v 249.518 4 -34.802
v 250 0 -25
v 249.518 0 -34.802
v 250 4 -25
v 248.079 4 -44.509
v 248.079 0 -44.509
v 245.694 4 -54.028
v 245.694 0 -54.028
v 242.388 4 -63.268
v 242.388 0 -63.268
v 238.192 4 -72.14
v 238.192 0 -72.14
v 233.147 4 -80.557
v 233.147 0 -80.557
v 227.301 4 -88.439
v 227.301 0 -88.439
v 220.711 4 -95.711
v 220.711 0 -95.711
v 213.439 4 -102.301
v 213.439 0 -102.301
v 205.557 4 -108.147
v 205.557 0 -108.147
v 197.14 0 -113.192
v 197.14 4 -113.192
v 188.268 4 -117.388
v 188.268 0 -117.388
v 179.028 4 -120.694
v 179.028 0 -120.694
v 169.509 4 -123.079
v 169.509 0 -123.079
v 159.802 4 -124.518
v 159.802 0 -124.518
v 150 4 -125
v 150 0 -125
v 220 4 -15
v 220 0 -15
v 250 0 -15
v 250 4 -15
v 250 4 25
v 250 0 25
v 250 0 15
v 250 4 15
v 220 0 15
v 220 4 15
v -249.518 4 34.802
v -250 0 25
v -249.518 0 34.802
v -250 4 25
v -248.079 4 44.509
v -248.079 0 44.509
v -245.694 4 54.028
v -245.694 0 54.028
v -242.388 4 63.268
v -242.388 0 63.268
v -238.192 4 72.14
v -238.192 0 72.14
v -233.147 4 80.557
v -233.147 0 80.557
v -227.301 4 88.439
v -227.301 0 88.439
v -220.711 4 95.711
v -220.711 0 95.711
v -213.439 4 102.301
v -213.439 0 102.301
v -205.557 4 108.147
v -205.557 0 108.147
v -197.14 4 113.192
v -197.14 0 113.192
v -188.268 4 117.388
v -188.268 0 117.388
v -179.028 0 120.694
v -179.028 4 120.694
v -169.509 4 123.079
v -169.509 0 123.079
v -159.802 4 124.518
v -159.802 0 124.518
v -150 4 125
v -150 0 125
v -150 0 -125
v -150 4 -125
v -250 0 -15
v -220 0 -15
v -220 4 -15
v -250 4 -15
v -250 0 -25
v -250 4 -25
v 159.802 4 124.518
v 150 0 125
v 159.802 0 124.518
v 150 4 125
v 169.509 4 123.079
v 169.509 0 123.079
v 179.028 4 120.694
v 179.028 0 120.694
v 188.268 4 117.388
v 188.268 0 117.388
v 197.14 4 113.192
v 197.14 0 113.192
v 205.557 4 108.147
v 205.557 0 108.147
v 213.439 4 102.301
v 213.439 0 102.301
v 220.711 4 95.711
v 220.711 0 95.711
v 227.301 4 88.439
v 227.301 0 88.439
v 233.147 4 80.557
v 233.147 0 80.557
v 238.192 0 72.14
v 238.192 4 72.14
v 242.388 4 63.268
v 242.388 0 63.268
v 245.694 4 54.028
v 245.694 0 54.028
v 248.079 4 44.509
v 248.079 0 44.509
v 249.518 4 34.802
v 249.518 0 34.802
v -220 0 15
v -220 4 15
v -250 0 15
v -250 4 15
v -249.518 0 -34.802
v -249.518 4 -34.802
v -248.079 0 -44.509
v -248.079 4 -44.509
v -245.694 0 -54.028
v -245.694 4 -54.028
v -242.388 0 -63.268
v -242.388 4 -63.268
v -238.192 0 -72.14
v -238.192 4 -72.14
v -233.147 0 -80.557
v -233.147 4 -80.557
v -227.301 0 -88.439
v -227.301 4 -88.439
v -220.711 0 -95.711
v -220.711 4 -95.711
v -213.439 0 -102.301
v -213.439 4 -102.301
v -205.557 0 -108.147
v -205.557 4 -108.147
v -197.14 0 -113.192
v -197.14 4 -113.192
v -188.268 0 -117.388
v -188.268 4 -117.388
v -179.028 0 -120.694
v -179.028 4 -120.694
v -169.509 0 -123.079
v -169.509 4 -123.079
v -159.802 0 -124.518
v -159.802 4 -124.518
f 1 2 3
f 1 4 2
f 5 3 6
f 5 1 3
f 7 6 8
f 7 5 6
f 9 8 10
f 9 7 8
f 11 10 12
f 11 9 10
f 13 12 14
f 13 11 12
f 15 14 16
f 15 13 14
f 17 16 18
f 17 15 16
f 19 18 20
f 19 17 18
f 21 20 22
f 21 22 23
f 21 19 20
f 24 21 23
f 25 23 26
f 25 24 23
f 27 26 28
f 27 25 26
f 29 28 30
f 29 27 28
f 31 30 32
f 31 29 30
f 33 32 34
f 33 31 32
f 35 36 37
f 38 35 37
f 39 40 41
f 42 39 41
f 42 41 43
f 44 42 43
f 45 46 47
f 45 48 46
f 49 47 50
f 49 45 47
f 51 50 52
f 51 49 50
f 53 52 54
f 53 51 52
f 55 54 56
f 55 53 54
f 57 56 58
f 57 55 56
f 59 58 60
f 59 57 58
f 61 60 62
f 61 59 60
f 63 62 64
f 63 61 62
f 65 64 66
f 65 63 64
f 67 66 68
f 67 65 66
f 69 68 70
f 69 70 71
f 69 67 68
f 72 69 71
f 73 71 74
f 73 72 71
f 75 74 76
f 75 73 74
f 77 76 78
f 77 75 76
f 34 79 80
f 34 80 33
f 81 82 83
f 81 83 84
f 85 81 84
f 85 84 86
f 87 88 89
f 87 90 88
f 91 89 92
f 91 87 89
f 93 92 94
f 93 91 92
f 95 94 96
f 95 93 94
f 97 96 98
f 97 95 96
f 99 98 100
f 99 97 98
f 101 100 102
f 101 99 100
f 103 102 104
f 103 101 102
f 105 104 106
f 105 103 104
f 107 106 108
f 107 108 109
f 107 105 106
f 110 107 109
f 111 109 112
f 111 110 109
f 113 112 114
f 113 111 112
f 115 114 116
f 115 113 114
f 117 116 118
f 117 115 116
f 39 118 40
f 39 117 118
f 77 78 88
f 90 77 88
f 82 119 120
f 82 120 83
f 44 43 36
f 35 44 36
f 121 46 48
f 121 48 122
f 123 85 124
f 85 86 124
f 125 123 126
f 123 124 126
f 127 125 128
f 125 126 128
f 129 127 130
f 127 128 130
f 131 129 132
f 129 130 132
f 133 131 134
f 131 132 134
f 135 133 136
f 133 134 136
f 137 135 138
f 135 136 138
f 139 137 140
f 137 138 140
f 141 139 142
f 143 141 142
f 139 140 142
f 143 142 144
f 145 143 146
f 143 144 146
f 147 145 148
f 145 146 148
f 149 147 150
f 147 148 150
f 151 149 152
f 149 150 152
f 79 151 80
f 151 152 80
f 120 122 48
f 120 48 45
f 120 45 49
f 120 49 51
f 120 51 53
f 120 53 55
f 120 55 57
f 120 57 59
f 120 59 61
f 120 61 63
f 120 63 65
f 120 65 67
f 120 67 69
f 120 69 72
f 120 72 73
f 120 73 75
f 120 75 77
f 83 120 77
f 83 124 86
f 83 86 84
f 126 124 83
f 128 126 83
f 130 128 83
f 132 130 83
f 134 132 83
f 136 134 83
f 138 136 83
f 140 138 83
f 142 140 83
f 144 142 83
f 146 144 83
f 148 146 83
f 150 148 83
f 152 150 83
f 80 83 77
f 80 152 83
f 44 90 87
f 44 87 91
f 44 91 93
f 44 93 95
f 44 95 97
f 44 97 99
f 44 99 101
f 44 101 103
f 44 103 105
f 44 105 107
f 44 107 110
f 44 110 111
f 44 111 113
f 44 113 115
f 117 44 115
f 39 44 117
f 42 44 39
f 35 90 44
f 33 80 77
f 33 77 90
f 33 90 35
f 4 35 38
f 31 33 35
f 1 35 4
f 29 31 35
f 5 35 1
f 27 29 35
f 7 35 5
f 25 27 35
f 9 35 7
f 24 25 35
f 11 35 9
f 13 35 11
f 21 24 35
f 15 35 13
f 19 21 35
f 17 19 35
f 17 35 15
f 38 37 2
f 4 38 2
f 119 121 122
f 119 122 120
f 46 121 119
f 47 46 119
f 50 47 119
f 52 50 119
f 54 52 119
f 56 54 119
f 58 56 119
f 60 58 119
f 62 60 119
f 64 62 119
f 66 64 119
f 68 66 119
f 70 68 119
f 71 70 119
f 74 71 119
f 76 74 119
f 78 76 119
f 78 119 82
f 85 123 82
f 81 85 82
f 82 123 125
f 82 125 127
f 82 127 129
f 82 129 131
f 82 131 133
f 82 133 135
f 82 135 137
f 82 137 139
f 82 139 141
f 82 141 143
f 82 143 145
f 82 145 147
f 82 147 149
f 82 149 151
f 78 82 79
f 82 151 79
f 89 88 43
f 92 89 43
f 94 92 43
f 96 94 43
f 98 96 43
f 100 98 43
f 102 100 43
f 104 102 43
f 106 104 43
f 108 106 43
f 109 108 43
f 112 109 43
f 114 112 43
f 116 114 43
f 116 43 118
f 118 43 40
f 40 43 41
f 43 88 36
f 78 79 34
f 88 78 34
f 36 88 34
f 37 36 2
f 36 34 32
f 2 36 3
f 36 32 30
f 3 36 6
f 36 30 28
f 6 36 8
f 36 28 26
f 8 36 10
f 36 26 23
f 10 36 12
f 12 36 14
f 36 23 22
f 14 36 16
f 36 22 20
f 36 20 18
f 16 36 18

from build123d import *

# Parameters (mm, degrees)
SKETCH1_W           = 500
SKETCH1_H           = 250
BOSS_EXTRUDE1_DEPTH = 4
FILLET1_R           = 100
CUT_EXTRUDE1_DEPTH  = 10


with BuildPart() as part:
    # Sketch1 → Boss-Extrude1 (new body)
    with BuildSketch(Plane(origin=(0, 0, 0), x_dir=(1, 0, 0), z_dir=(0, 1, 0))):
        Rectangle(SKETCH1_W, SKETCH1_H)
    extrude(amount=BOSS_EXTRUDE1_DEPTH)

    # Fillet1
    fillet1_edges = [part.edges().sort_by_distance(p)[0] for p in [
        (250, 2, 125),
        (-250, 2, 125),
        (-250, 2, -125),
        (250, 2, -125),
    ]]
    fillet(fillet1_edges, radius=FILLET1_R)

    # Sketch2 → Cut-Extrude1 (cut)
    with BuildSketch(Plane(origin=(0, 0, 0), x_dir=(-1, 0, 0), z_dir=(0, -1, 0))):
        Polygon((250, 0), (250, -15), (220, -15), (220, 15), (250, 15), align=None)
        Polygon((-250, 0), (-250, -15), (-220, -15), (-220, 15), (-250, 15), align=None)
    extrude(amount=-CUT_EXTRUDE1_DEPTH, mode=Mode.SUBTRACT)


solid = part.part
